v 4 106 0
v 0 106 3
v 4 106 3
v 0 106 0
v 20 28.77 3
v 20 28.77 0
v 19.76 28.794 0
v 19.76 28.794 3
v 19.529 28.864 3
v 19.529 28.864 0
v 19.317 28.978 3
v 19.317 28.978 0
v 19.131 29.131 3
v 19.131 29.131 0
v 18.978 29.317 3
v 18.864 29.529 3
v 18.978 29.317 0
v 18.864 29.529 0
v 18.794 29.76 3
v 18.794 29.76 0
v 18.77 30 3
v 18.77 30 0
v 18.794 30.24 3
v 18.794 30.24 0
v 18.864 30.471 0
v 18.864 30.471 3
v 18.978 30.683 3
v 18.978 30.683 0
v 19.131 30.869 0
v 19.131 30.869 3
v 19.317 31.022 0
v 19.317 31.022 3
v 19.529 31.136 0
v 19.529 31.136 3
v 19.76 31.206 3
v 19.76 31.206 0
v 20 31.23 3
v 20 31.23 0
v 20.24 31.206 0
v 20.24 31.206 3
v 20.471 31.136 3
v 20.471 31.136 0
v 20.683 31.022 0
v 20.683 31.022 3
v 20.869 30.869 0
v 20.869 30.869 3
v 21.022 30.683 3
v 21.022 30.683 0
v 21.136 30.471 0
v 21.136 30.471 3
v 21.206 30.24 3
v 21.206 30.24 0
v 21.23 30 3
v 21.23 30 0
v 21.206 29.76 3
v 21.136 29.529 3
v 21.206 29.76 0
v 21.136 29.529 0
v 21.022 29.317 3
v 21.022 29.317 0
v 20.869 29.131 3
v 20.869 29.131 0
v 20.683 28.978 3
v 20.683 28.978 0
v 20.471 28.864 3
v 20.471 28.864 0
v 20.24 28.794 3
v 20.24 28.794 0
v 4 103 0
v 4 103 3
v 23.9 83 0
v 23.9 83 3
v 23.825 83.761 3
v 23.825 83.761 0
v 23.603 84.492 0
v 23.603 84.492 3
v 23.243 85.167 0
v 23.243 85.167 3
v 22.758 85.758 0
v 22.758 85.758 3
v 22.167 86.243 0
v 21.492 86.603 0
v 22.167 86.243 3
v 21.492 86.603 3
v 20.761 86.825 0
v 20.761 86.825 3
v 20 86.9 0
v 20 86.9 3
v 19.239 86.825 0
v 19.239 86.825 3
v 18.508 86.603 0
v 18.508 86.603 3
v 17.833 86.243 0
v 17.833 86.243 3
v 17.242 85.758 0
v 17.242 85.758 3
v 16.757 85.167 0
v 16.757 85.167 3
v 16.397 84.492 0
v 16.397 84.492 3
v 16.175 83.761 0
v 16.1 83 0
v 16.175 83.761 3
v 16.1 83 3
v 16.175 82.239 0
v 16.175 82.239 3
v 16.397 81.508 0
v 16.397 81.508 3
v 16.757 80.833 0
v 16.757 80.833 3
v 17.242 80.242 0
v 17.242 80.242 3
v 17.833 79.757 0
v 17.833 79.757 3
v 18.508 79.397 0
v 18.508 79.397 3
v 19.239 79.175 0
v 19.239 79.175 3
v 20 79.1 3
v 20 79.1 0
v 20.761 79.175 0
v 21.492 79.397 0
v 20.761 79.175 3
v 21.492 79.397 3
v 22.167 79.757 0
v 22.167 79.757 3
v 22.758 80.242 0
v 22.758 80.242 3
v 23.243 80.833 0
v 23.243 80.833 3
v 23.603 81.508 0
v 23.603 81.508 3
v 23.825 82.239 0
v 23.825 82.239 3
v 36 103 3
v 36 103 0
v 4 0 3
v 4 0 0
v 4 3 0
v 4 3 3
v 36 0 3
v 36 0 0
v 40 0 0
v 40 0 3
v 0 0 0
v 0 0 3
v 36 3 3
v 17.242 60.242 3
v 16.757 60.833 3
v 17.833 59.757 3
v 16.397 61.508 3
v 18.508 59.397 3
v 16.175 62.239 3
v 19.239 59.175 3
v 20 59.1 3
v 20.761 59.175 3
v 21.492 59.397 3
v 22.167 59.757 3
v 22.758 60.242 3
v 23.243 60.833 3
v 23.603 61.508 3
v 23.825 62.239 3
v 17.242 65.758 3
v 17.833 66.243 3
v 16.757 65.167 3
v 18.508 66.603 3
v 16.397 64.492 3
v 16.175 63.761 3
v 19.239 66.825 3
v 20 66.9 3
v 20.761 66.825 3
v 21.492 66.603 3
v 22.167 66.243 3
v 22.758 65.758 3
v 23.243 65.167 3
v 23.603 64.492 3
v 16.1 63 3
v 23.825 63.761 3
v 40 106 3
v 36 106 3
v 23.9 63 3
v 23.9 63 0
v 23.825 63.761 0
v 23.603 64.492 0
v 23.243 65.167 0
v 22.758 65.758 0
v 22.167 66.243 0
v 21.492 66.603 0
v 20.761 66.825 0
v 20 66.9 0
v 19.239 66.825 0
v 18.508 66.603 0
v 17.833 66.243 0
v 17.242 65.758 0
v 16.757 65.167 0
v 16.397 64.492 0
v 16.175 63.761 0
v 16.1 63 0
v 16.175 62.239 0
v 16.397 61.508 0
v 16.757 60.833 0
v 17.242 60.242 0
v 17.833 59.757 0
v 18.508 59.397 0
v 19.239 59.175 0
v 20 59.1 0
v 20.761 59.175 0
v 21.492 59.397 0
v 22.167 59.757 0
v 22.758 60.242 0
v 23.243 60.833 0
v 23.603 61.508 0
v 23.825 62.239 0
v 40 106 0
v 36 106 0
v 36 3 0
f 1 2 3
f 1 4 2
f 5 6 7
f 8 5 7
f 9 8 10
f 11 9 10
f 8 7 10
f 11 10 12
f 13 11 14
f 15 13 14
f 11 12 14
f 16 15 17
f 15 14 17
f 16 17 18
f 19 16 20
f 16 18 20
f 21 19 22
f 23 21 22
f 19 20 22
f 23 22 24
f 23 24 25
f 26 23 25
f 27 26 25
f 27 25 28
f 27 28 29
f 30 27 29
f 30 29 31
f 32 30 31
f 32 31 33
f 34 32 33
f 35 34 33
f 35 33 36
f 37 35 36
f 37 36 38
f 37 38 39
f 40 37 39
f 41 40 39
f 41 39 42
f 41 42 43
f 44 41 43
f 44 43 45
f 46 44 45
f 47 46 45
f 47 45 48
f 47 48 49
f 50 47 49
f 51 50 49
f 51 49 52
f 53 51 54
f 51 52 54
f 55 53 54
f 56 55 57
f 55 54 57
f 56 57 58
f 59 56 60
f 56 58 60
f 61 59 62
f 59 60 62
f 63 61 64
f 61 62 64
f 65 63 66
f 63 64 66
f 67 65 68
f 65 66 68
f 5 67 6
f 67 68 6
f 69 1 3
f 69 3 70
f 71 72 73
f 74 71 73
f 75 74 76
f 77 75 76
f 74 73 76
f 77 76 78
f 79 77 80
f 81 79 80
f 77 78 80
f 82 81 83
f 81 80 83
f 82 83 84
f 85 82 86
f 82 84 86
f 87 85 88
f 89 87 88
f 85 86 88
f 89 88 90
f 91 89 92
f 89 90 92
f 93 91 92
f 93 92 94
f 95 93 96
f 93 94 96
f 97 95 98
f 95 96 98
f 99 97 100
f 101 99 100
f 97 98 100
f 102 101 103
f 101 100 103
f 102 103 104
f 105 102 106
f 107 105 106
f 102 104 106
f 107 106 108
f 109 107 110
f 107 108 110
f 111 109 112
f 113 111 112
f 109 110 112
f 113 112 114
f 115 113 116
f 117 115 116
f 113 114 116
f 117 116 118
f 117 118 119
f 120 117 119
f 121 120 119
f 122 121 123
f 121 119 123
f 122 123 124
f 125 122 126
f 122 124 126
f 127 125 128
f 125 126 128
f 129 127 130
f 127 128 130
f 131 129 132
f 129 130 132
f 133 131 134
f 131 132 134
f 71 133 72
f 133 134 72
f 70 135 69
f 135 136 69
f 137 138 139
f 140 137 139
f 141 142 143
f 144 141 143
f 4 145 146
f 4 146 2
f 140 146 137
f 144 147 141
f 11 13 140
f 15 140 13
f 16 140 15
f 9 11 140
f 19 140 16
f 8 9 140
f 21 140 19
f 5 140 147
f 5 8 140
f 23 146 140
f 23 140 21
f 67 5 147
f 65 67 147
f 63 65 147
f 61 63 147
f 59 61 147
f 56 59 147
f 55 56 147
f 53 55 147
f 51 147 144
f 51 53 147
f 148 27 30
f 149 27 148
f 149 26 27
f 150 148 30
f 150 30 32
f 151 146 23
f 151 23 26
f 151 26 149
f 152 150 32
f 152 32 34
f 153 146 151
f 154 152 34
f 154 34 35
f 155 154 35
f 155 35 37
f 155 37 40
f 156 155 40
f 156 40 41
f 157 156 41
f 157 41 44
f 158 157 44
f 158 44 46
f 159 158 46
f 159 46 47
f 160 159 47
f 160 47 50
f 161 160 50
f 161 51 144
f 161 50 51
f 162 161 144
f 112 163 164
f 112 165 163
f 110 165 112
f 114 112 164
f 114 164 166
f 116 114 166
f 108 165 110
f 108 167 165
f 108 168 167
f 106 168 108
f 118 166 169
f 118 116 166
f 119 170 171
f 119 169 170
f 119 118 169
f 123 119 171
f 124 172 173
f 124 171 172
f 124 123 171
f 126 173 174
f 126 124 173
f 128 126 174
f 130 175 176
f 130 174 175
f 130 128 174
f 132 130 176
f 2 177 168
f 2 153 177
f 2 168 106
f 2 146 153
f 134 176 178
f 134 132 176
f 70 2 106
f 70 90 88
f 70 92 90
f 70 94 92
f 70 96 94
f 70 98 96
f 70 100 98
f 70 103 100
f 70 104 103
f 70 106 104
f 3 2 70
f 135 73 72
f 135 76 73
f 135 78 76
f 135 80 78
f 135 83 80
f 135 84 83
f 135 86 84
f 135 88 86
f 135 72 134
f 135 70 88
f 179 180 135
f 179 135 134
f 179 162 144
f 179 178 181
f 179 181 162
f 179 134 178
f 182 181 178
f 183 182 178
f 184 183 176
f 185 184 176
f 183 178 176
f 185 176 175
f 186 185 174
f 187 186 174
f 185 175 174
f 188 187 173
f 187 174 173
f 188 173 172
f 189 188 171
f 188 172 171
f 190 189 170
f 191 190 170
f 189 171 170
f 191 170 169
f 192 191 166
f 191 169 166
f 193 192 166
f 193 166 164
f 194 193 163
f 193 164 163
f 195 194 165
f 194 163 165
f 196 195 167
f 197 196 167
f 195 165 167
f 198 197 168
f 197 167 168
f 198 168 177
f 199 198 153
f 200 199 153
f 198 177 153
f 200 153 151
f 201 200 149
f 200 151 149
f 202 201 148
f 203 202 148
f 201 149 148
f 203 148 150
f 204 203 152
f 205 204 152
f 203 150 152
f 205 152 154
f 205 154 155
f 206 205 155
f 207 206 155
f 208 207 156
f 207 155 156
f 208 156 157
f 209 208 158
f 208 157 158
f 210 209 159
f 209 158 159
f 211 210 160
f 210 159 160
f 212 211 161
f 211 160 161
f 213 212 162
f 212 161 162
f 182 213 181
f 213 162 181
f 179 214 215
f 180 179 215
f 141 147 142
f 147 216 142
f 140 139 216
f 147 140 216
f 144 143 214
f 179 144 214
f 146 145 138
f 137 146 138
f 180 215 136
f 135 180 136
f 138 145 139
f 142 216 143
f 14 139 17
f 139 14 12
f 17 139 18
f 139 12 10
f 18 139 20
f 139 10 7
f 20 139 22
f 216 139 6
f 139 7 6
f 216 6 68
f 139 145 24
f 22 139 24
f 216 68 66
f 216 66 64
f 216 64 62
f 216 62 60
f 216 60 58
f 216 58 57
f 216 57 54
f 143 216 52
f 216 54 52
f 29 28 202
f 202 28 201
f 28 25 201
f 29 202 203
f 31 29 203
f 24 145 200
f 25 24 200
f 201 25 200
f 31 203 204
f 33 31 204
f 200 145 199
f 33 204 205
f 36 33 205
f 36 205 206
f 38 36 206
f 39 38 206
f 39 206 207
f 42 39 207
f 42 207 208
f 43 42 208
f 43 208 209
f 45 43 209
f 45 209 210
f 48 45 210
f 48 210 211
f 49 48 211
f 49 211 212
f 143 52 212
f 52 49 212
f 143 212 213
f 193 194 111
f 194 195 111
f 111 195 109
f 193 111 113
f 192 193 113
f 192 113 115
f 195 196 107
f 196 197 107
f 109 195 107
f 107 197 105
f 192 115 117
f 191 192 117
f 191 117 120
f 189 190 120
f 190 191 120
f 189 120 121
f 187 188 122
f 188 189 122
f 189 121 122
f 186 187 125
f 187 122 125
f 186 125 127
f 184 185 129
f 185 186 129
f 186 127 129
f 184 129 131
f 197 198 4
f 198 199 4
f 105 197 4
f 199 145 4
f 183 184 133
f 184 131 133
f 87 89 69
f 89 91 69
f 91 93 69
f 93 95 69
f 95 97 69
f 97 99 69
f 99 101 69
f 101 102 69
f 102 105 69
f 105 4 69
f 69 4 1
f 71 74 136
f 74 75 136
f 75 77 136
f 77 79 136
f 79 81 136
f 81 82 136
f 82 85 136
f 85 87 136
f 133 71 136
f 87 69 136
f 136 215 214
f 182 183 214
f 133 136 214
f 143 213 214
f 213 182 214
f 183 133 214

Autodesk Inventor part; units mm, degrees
ref_plane "Plan YZ" through (0, 0, 0) normal (1, 0, 0) x (0, 1, 0)
ref_plane "Plan XZ" through (0, 0, 0) normal (0, 1, 0) x (-1, 0, 0)
ref_plane "Plan XY" through (0, 0, 0) normal (0, 0, 1) x (1, 0, 0)
sketch "Esquisse1" plane through (0, 0, 0) normal (0, 0, 1) x (1, 0, 0)
  line L0 (4, 3) -> (36, 3)
  line L1 (36, 103) -> (4, 103)
  line L2 (0, 106) -> (4, 106)
  line L3 (4, 106) -> (4, 103)
  line L4 (40, 106) -> (36, 106)
  line L5 (36, 106) -> (36, 103)
  line L6 (0, 0) -> (4, 0)
  line L7 (4, 0) -> (4, 3)
  line L8 (36, 3) -> (36, 0)
  line L9 (36, 0) -> (40, 0)
  line L10 (40, 0) -> (40, 106)
  line L11 (0, 0) -> (0, 106)
  dimension "d6" = 100
  dimension "d8" = 3
  dimension "d9" = 3
  dimension "d13" = 40
  dimension "d14" = 4
  dimension "d15" = 4
extrude "Extrusion1" add sketch "Esquisse1" along normal blind 3
sketch "Esquisse6" plane through (0, 0, 3) normal (0, 0, 1) x (1, 0, 0)
  line L0 (0, 106) -> (0, 0) projected
  line L1 (40, 0) -> (40, 106) projected
  line L2 (0, -646.5316) -> (20, -646.5316) construction
  line L3 (40, -683.5995) -> (20, -683.5995) construction
  line L4 (20, 88.2545) -> (20, 14.0947) construction
  circle A0 centre (20, 83) radius 3.9
  circle A1 centre (20, 63) radius 3.9
  line L5 (36, 103) -> (4, 103) projected
  line L6 (36, 0) -> (40, 0) projected
  dimension "d18" = 20
  dimension "d19" = 20
  dimension "d20" = 7.8
  dimension "d21" = 7.8
extrude "Extrusion2" cut sketch "Esquisse6" against normal through all
sketch "Esquisse7" plane through (0, 0, 3) normal (0, 0, 1) x (1, 0, 0)
  line L0 (40, 0) -> (40, 106) construction
  line L1 (0, 106) -> (0, 0) construction
  line L2 (20, 50.9423) -> (20, 15.6231) construction
  line L3 (0, 42.5223) -> (20, 42.5223) construction
  line L4 (20, 46.099) -> (40, 46.099) construction
  line L5 (36, 0) -> (40, 0) projected
  point P0 (20, 30)
  dimension "d27" = 30
hole "Perçage1" at (20, 30, 3) direction (0, 0, -1) diameter 2.459 end through all thread size "M3x0.5" class "6H" standard "ISO M"
properties part number "S1702_paroiinterne" material "Plastique PMMA"
